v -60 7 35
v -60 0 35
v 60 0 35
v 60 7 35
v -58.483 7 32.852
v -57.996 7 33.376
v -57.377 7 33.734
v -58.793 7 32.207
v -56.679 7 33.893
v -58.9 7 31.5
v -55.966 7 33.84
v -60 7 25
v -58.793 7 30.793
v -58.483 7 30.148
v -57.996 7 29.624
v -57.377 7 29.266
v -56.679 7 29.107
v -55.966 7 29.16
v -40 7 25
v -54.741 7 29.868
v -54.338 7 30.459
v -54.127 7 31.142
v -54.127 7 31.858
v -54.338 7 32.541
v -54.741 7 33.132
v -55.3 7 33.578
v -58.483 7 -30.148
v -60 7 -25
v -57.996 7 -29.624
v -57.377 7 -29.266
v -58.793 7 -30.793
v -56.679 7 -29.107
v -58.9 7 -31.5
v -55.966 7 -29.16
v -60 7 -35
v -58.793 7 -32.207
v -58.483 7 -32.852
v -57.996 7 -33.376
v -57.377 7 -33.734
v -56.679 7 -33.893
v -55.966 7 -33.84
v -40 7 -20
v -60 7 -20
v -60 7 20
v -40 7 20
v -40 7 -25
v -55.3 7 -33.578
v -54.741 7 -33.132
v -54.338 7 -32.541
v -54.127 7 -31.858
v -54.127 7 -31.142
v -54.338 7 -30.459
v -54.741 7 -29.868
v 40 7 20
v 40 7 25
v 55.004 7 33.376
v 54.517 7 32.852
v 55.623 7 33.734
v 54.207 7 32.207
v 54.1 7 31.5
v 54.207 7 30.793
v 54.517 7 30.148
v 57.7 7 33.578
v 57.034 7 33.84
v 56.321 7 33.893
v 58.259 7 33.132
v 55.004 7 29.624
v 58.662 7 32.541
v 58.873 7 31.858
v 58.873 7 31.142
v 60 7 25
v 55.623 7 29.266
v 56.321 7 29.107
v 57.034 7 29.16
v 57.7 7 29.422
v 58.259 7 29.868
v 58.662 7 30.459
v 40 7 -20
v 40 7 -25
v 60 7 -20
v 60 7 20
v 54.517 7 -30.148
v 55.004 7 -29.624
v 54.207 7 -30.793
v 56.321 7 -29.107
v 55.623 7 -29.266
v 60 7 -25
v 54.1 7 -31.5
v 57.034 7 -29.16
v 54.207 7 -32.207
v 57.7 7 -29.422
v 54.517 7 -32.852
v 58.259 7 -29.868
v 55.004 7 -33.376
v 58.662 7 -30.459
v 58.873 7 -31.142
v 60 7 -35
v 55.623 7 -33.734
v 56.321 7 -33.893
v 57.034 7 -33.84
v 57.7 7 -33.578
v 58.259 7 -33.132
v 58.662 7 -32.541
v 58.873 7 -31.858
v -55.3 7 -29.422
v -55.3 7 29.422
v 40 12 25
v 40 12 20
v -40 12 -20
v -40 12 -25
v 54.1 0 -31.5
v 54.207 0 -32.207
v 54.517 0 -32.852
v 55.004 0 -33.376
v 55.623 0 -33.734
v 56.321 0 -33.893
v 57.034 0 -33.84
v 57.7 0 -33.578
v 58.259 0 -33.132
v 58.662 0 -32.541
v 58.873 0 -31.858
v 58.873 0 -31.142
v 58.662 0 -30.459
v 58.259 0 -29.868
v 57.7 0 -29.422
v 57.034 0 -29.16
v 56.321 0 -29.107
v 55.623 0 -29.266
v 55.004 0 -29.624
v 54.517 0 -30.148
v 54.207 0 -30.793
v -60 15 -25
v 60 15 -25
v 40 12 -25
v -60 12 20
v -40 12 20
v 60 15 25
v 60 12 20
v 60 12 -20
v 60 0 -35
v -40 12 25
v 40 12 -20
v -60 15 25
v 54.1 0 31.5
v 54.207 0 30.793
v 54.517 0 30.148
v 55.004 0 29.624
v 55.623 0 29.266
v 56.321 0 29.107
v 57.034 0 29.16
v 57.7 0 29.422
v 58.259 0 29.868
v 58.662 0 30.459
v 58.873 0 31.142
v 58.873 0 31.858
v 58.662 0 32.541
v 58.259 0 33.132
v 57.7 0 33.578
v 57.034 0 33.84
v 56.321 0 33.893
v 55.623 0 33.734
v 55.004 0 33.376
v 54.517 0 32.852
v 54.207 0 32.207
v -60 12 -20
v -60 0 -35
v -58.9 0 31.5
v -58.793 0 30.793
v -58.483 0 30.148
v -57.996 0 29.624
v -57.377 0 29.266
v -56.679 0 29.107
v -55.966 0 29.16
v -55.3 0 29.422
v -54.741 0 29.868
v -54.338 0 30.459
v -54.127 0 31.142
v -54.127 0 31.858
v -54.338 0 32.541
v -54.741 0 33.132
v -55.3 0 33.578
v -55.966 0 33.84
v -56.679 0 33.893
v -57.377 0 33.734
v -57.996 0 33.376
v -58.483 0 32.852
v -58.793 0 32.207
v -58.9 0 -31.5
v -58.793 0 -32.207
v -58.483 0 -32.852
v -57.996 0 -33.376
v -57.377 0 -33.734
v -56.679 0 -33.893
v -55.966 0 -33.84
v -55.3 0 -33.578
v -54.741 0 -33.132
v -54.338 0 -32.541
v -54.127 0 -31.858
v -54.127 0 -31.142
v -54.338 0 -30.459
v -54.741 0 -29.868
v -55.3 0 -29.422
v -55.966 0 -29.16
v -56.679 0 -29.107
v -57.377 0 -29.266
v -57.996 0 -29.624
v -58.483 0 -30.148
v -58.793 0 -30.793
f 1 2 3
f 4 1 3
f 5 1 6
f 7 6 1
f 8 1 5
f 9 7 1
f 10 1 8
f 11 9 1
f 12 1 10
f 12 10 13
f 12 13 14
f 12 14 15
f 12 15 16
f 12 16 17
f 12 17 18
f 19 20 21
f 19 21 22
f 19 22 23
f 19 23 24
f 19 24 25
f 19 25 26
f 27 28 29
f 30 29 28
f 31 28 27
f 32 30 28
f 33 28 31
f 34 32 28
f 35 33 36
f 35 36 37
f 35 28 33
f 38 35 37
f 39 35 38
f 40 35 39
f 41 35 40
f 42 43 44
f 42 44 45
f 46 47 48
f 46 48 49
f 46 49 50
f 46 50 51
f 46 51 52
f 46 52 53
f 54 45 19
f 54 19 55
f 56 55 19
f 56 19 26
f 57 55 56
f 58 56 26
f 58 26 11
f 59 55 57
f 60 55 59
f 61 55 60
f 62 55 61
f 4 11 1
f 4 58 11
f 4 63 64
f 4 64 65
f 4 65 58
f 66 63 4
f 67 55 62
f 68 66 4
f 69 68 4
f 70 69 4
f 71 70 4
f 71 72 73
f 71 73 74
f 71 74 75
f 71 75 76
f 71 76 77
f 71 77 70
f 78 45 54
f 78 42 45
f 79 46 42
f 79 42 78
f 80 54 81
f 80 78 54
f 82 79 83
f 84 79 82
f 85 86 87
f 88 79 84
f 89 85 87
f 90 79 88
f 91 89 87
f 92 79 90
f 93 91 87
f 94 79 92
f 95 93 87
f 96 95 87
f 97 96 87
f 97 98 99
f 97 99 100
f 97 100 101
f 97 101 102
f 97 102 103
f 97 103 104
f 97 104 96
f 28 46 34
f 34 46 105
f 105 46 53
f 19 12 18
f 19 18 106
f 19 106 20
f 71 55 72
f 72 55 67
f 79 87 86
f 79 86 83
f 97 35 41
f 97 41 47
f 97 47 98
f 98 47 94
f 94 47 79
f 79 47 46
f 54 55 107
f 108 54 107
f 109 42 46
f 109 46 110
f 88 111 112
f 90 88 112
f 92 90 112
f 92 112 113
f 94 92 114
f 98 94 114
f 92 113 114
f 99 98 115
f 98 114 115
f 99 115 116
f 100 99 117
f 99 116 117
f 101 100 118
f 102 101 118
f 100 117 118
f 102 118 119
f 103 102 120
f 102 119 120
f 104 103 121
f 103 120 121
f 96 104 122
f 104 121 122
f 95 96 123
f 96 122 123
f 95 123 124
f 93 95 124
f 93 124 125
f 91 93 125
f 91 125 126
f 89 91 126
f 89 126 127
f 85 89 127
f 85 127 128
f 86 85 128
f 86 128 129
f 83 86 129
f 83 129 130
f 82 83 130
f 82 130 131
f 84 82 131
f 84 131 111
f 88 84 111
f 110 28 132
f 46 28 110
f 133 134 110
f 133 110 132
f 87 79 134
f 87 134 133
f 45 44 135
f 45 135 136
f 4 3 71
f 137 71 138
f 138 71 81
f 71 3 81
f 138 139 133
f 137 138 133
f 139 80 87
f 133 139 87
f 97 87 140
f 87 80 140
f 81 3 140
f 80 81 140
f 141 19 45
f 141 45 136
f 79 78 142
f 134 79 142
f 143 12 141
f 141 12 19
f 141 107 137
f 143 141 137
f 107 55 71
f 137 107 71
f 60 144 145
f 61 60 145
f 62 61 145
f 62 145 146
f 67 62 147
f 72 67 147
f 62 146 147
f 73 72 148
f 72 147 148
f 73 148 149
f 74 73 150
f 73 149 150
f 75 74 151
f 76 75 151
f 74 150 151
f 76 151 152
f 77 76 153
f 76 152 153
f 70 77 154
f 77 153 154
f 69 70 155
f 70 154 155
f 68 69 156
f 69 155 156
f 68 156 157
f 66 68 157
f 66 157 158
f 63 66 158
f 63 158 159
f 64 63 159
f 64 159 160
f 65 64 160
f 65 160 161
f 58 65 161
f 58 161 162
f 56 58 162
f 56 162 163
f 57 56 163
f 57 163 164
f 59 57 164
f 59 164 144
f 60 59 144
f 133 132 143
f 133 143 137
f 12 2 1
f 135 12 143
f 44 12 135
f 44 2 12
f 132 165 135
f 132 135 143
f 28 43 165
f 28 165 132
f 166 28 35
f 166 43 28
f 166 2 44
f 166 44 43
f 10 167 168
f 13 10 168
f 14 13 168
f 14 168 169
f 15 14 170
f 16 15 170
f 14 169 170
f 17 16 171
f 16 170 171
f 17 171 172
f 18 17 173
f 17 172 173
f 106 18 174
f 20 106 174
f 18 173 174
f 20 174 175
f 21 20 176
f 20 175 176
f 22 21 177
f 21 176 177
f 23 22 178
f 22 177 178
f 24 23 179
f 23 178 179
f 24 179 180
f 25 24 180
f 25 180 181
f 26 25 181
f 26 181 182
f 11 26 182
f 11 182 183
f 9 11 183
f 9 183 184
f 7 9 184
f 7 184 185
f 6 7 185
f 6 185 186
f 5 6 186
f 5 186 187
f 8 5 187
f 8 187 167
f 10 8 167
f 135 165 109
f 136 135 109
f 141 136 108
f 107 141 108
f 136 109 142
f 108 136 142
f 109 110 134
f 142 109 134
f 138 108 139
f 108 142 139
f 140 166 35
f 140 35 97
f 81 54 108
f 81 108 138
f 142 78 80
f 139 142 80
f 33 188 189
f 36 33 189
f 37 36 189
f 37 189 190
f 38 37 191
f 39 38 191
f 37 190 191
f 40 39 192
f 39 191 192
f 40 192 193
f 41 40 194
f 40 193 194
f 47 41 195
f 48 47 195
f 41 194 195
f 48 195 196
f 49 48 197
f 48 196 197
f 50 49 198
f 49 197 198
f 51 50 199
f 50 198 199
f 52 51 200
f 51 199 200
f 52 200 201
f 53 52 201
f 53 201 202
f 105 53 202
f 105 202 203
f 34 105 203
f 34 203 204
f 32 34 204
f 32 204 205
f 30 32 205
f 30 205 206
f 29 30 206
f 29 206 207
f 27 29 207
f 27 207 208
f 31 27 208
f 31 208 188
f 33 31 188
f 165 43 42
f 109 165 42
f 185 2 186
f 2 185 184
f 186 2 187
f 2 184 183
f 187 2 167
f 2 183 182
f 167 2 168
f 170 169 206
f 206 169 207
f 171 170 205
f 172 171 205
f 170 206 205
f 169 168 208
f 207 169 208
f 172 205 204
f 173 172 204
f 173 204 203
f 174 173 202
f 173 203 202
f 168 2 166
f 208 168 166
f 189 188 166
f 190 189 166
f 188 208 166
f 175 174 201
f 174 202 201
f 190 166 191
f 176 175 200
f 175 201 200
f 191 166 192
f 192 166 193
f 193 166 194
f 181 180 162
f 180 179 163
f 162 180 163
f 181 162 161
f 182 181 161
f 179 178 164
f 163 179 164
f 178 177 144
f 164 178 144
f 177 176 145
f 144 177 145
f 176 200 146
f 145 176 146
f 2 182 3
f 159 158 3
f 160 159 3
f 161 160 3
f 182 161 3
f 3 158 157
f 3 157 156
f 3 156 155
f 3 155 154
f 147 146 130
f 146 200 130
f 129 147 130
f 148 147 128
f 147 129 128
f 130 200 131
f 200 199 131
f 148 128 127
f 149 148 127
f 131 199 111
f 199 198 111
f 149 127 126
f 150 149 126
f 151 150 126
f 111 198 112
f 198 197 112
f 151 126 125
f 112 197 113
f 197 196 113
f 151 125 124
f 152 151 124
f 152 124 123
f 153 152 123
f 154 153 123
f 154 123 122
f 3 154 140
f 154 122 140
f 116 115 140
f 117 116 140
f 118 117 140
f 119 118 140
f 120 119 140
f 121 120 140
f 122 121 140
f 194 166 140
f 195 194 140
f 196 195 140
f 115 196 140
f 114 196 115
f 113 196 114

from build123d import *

# Parameters (mm, degrees)
CROQUIS1_W                   = 120
CROQUIS1_H                   = 70
SALIENTE_EXTRUIR1_DEPTH      = 7
TALADRO_DE_MARGEN_PARA_M41_D = 4.8
CROQUIS8_W                   = 120
CROQUIS8_H                   = 5
SALIENTE_EXTRUIR2_DEPTH      = 5
CROQUIS9_W                   = 120
CROQUIS9_H                   = 50
SALIENTE_EXTRUIR3_DEPTH      = 3
CROQUIS10_W                  = 80
CROQUIS10_H                  = 5
CORTAR_EXTRUIR1_DEPTH        = 87.168439698


with BuildPart() as part:
    # Croquis1 → Saliente-Extruir1 (new body)
    with BuildSketch(Plane(origin=(0, 0, 0), x_dir=(1, 0, 0), z_dir=(0, 1, 0))):
        Rectangle(CROQUIS1_W, CROQUIS1_H)
    extrude(amount=SALIENTE_EXTRUIR1_DEPTH)

    # Taladro de margen para M41 (through all)
    with Locations(Plane(origin=(0, 7, 0), x_dir=(1, 0, 0), z_dir=(0, 1, 0))):
        with Locations((56.5, 31.5), (56.5, -31.5), (-56.5, -31.5), (-56.5, 31.5)):
            Hole(TALADRO_DE_MARGEN_PARA_M41_D / 2)

    # Croquis8 → Saliente-Extruir2 (add)
    with BuildSketch(Plane(origin=(0, 7, 0), x_dir=(1, 0, 0), z_dir=(0, 1, 0))):
        with Locations((0, 22.5)):
            Rectangle(CROQUIS8_W, CROQUIS8_H)
        with Locations((0, -22.5)):
            Rectangle(CROQUIS8_W, CROQUIS8_H)
    extrude(amount=SALIENTE_EXTRUIR2_DEPTH)

    # Croquis9 → Saliente-Extruir3 (add)
    with BuildSketch(Plane(origin=(0, 12, 0), x_dir=(1, 0, 0), z_dir=(0, 1, 0))):
        Rectangle(CROQUIS9_W, CROQUIS9_H)
    extrude(amount=SALIENTE_EXTRUIR3_DEPTH)

    # Croquis10 → Cortar-Extruir1 (cut, through all)
    with BuildSketch(Plane.XY.offset(25)):
        with Locations((0, 9.5)):
            Rectangle(CROQUIS10_W, CROQUIS10_H)
    extrude(amount=-CORTAR_EXTRUIR1_DEPTH, mode=Mode.SUBTRACT)


solid = part.part
